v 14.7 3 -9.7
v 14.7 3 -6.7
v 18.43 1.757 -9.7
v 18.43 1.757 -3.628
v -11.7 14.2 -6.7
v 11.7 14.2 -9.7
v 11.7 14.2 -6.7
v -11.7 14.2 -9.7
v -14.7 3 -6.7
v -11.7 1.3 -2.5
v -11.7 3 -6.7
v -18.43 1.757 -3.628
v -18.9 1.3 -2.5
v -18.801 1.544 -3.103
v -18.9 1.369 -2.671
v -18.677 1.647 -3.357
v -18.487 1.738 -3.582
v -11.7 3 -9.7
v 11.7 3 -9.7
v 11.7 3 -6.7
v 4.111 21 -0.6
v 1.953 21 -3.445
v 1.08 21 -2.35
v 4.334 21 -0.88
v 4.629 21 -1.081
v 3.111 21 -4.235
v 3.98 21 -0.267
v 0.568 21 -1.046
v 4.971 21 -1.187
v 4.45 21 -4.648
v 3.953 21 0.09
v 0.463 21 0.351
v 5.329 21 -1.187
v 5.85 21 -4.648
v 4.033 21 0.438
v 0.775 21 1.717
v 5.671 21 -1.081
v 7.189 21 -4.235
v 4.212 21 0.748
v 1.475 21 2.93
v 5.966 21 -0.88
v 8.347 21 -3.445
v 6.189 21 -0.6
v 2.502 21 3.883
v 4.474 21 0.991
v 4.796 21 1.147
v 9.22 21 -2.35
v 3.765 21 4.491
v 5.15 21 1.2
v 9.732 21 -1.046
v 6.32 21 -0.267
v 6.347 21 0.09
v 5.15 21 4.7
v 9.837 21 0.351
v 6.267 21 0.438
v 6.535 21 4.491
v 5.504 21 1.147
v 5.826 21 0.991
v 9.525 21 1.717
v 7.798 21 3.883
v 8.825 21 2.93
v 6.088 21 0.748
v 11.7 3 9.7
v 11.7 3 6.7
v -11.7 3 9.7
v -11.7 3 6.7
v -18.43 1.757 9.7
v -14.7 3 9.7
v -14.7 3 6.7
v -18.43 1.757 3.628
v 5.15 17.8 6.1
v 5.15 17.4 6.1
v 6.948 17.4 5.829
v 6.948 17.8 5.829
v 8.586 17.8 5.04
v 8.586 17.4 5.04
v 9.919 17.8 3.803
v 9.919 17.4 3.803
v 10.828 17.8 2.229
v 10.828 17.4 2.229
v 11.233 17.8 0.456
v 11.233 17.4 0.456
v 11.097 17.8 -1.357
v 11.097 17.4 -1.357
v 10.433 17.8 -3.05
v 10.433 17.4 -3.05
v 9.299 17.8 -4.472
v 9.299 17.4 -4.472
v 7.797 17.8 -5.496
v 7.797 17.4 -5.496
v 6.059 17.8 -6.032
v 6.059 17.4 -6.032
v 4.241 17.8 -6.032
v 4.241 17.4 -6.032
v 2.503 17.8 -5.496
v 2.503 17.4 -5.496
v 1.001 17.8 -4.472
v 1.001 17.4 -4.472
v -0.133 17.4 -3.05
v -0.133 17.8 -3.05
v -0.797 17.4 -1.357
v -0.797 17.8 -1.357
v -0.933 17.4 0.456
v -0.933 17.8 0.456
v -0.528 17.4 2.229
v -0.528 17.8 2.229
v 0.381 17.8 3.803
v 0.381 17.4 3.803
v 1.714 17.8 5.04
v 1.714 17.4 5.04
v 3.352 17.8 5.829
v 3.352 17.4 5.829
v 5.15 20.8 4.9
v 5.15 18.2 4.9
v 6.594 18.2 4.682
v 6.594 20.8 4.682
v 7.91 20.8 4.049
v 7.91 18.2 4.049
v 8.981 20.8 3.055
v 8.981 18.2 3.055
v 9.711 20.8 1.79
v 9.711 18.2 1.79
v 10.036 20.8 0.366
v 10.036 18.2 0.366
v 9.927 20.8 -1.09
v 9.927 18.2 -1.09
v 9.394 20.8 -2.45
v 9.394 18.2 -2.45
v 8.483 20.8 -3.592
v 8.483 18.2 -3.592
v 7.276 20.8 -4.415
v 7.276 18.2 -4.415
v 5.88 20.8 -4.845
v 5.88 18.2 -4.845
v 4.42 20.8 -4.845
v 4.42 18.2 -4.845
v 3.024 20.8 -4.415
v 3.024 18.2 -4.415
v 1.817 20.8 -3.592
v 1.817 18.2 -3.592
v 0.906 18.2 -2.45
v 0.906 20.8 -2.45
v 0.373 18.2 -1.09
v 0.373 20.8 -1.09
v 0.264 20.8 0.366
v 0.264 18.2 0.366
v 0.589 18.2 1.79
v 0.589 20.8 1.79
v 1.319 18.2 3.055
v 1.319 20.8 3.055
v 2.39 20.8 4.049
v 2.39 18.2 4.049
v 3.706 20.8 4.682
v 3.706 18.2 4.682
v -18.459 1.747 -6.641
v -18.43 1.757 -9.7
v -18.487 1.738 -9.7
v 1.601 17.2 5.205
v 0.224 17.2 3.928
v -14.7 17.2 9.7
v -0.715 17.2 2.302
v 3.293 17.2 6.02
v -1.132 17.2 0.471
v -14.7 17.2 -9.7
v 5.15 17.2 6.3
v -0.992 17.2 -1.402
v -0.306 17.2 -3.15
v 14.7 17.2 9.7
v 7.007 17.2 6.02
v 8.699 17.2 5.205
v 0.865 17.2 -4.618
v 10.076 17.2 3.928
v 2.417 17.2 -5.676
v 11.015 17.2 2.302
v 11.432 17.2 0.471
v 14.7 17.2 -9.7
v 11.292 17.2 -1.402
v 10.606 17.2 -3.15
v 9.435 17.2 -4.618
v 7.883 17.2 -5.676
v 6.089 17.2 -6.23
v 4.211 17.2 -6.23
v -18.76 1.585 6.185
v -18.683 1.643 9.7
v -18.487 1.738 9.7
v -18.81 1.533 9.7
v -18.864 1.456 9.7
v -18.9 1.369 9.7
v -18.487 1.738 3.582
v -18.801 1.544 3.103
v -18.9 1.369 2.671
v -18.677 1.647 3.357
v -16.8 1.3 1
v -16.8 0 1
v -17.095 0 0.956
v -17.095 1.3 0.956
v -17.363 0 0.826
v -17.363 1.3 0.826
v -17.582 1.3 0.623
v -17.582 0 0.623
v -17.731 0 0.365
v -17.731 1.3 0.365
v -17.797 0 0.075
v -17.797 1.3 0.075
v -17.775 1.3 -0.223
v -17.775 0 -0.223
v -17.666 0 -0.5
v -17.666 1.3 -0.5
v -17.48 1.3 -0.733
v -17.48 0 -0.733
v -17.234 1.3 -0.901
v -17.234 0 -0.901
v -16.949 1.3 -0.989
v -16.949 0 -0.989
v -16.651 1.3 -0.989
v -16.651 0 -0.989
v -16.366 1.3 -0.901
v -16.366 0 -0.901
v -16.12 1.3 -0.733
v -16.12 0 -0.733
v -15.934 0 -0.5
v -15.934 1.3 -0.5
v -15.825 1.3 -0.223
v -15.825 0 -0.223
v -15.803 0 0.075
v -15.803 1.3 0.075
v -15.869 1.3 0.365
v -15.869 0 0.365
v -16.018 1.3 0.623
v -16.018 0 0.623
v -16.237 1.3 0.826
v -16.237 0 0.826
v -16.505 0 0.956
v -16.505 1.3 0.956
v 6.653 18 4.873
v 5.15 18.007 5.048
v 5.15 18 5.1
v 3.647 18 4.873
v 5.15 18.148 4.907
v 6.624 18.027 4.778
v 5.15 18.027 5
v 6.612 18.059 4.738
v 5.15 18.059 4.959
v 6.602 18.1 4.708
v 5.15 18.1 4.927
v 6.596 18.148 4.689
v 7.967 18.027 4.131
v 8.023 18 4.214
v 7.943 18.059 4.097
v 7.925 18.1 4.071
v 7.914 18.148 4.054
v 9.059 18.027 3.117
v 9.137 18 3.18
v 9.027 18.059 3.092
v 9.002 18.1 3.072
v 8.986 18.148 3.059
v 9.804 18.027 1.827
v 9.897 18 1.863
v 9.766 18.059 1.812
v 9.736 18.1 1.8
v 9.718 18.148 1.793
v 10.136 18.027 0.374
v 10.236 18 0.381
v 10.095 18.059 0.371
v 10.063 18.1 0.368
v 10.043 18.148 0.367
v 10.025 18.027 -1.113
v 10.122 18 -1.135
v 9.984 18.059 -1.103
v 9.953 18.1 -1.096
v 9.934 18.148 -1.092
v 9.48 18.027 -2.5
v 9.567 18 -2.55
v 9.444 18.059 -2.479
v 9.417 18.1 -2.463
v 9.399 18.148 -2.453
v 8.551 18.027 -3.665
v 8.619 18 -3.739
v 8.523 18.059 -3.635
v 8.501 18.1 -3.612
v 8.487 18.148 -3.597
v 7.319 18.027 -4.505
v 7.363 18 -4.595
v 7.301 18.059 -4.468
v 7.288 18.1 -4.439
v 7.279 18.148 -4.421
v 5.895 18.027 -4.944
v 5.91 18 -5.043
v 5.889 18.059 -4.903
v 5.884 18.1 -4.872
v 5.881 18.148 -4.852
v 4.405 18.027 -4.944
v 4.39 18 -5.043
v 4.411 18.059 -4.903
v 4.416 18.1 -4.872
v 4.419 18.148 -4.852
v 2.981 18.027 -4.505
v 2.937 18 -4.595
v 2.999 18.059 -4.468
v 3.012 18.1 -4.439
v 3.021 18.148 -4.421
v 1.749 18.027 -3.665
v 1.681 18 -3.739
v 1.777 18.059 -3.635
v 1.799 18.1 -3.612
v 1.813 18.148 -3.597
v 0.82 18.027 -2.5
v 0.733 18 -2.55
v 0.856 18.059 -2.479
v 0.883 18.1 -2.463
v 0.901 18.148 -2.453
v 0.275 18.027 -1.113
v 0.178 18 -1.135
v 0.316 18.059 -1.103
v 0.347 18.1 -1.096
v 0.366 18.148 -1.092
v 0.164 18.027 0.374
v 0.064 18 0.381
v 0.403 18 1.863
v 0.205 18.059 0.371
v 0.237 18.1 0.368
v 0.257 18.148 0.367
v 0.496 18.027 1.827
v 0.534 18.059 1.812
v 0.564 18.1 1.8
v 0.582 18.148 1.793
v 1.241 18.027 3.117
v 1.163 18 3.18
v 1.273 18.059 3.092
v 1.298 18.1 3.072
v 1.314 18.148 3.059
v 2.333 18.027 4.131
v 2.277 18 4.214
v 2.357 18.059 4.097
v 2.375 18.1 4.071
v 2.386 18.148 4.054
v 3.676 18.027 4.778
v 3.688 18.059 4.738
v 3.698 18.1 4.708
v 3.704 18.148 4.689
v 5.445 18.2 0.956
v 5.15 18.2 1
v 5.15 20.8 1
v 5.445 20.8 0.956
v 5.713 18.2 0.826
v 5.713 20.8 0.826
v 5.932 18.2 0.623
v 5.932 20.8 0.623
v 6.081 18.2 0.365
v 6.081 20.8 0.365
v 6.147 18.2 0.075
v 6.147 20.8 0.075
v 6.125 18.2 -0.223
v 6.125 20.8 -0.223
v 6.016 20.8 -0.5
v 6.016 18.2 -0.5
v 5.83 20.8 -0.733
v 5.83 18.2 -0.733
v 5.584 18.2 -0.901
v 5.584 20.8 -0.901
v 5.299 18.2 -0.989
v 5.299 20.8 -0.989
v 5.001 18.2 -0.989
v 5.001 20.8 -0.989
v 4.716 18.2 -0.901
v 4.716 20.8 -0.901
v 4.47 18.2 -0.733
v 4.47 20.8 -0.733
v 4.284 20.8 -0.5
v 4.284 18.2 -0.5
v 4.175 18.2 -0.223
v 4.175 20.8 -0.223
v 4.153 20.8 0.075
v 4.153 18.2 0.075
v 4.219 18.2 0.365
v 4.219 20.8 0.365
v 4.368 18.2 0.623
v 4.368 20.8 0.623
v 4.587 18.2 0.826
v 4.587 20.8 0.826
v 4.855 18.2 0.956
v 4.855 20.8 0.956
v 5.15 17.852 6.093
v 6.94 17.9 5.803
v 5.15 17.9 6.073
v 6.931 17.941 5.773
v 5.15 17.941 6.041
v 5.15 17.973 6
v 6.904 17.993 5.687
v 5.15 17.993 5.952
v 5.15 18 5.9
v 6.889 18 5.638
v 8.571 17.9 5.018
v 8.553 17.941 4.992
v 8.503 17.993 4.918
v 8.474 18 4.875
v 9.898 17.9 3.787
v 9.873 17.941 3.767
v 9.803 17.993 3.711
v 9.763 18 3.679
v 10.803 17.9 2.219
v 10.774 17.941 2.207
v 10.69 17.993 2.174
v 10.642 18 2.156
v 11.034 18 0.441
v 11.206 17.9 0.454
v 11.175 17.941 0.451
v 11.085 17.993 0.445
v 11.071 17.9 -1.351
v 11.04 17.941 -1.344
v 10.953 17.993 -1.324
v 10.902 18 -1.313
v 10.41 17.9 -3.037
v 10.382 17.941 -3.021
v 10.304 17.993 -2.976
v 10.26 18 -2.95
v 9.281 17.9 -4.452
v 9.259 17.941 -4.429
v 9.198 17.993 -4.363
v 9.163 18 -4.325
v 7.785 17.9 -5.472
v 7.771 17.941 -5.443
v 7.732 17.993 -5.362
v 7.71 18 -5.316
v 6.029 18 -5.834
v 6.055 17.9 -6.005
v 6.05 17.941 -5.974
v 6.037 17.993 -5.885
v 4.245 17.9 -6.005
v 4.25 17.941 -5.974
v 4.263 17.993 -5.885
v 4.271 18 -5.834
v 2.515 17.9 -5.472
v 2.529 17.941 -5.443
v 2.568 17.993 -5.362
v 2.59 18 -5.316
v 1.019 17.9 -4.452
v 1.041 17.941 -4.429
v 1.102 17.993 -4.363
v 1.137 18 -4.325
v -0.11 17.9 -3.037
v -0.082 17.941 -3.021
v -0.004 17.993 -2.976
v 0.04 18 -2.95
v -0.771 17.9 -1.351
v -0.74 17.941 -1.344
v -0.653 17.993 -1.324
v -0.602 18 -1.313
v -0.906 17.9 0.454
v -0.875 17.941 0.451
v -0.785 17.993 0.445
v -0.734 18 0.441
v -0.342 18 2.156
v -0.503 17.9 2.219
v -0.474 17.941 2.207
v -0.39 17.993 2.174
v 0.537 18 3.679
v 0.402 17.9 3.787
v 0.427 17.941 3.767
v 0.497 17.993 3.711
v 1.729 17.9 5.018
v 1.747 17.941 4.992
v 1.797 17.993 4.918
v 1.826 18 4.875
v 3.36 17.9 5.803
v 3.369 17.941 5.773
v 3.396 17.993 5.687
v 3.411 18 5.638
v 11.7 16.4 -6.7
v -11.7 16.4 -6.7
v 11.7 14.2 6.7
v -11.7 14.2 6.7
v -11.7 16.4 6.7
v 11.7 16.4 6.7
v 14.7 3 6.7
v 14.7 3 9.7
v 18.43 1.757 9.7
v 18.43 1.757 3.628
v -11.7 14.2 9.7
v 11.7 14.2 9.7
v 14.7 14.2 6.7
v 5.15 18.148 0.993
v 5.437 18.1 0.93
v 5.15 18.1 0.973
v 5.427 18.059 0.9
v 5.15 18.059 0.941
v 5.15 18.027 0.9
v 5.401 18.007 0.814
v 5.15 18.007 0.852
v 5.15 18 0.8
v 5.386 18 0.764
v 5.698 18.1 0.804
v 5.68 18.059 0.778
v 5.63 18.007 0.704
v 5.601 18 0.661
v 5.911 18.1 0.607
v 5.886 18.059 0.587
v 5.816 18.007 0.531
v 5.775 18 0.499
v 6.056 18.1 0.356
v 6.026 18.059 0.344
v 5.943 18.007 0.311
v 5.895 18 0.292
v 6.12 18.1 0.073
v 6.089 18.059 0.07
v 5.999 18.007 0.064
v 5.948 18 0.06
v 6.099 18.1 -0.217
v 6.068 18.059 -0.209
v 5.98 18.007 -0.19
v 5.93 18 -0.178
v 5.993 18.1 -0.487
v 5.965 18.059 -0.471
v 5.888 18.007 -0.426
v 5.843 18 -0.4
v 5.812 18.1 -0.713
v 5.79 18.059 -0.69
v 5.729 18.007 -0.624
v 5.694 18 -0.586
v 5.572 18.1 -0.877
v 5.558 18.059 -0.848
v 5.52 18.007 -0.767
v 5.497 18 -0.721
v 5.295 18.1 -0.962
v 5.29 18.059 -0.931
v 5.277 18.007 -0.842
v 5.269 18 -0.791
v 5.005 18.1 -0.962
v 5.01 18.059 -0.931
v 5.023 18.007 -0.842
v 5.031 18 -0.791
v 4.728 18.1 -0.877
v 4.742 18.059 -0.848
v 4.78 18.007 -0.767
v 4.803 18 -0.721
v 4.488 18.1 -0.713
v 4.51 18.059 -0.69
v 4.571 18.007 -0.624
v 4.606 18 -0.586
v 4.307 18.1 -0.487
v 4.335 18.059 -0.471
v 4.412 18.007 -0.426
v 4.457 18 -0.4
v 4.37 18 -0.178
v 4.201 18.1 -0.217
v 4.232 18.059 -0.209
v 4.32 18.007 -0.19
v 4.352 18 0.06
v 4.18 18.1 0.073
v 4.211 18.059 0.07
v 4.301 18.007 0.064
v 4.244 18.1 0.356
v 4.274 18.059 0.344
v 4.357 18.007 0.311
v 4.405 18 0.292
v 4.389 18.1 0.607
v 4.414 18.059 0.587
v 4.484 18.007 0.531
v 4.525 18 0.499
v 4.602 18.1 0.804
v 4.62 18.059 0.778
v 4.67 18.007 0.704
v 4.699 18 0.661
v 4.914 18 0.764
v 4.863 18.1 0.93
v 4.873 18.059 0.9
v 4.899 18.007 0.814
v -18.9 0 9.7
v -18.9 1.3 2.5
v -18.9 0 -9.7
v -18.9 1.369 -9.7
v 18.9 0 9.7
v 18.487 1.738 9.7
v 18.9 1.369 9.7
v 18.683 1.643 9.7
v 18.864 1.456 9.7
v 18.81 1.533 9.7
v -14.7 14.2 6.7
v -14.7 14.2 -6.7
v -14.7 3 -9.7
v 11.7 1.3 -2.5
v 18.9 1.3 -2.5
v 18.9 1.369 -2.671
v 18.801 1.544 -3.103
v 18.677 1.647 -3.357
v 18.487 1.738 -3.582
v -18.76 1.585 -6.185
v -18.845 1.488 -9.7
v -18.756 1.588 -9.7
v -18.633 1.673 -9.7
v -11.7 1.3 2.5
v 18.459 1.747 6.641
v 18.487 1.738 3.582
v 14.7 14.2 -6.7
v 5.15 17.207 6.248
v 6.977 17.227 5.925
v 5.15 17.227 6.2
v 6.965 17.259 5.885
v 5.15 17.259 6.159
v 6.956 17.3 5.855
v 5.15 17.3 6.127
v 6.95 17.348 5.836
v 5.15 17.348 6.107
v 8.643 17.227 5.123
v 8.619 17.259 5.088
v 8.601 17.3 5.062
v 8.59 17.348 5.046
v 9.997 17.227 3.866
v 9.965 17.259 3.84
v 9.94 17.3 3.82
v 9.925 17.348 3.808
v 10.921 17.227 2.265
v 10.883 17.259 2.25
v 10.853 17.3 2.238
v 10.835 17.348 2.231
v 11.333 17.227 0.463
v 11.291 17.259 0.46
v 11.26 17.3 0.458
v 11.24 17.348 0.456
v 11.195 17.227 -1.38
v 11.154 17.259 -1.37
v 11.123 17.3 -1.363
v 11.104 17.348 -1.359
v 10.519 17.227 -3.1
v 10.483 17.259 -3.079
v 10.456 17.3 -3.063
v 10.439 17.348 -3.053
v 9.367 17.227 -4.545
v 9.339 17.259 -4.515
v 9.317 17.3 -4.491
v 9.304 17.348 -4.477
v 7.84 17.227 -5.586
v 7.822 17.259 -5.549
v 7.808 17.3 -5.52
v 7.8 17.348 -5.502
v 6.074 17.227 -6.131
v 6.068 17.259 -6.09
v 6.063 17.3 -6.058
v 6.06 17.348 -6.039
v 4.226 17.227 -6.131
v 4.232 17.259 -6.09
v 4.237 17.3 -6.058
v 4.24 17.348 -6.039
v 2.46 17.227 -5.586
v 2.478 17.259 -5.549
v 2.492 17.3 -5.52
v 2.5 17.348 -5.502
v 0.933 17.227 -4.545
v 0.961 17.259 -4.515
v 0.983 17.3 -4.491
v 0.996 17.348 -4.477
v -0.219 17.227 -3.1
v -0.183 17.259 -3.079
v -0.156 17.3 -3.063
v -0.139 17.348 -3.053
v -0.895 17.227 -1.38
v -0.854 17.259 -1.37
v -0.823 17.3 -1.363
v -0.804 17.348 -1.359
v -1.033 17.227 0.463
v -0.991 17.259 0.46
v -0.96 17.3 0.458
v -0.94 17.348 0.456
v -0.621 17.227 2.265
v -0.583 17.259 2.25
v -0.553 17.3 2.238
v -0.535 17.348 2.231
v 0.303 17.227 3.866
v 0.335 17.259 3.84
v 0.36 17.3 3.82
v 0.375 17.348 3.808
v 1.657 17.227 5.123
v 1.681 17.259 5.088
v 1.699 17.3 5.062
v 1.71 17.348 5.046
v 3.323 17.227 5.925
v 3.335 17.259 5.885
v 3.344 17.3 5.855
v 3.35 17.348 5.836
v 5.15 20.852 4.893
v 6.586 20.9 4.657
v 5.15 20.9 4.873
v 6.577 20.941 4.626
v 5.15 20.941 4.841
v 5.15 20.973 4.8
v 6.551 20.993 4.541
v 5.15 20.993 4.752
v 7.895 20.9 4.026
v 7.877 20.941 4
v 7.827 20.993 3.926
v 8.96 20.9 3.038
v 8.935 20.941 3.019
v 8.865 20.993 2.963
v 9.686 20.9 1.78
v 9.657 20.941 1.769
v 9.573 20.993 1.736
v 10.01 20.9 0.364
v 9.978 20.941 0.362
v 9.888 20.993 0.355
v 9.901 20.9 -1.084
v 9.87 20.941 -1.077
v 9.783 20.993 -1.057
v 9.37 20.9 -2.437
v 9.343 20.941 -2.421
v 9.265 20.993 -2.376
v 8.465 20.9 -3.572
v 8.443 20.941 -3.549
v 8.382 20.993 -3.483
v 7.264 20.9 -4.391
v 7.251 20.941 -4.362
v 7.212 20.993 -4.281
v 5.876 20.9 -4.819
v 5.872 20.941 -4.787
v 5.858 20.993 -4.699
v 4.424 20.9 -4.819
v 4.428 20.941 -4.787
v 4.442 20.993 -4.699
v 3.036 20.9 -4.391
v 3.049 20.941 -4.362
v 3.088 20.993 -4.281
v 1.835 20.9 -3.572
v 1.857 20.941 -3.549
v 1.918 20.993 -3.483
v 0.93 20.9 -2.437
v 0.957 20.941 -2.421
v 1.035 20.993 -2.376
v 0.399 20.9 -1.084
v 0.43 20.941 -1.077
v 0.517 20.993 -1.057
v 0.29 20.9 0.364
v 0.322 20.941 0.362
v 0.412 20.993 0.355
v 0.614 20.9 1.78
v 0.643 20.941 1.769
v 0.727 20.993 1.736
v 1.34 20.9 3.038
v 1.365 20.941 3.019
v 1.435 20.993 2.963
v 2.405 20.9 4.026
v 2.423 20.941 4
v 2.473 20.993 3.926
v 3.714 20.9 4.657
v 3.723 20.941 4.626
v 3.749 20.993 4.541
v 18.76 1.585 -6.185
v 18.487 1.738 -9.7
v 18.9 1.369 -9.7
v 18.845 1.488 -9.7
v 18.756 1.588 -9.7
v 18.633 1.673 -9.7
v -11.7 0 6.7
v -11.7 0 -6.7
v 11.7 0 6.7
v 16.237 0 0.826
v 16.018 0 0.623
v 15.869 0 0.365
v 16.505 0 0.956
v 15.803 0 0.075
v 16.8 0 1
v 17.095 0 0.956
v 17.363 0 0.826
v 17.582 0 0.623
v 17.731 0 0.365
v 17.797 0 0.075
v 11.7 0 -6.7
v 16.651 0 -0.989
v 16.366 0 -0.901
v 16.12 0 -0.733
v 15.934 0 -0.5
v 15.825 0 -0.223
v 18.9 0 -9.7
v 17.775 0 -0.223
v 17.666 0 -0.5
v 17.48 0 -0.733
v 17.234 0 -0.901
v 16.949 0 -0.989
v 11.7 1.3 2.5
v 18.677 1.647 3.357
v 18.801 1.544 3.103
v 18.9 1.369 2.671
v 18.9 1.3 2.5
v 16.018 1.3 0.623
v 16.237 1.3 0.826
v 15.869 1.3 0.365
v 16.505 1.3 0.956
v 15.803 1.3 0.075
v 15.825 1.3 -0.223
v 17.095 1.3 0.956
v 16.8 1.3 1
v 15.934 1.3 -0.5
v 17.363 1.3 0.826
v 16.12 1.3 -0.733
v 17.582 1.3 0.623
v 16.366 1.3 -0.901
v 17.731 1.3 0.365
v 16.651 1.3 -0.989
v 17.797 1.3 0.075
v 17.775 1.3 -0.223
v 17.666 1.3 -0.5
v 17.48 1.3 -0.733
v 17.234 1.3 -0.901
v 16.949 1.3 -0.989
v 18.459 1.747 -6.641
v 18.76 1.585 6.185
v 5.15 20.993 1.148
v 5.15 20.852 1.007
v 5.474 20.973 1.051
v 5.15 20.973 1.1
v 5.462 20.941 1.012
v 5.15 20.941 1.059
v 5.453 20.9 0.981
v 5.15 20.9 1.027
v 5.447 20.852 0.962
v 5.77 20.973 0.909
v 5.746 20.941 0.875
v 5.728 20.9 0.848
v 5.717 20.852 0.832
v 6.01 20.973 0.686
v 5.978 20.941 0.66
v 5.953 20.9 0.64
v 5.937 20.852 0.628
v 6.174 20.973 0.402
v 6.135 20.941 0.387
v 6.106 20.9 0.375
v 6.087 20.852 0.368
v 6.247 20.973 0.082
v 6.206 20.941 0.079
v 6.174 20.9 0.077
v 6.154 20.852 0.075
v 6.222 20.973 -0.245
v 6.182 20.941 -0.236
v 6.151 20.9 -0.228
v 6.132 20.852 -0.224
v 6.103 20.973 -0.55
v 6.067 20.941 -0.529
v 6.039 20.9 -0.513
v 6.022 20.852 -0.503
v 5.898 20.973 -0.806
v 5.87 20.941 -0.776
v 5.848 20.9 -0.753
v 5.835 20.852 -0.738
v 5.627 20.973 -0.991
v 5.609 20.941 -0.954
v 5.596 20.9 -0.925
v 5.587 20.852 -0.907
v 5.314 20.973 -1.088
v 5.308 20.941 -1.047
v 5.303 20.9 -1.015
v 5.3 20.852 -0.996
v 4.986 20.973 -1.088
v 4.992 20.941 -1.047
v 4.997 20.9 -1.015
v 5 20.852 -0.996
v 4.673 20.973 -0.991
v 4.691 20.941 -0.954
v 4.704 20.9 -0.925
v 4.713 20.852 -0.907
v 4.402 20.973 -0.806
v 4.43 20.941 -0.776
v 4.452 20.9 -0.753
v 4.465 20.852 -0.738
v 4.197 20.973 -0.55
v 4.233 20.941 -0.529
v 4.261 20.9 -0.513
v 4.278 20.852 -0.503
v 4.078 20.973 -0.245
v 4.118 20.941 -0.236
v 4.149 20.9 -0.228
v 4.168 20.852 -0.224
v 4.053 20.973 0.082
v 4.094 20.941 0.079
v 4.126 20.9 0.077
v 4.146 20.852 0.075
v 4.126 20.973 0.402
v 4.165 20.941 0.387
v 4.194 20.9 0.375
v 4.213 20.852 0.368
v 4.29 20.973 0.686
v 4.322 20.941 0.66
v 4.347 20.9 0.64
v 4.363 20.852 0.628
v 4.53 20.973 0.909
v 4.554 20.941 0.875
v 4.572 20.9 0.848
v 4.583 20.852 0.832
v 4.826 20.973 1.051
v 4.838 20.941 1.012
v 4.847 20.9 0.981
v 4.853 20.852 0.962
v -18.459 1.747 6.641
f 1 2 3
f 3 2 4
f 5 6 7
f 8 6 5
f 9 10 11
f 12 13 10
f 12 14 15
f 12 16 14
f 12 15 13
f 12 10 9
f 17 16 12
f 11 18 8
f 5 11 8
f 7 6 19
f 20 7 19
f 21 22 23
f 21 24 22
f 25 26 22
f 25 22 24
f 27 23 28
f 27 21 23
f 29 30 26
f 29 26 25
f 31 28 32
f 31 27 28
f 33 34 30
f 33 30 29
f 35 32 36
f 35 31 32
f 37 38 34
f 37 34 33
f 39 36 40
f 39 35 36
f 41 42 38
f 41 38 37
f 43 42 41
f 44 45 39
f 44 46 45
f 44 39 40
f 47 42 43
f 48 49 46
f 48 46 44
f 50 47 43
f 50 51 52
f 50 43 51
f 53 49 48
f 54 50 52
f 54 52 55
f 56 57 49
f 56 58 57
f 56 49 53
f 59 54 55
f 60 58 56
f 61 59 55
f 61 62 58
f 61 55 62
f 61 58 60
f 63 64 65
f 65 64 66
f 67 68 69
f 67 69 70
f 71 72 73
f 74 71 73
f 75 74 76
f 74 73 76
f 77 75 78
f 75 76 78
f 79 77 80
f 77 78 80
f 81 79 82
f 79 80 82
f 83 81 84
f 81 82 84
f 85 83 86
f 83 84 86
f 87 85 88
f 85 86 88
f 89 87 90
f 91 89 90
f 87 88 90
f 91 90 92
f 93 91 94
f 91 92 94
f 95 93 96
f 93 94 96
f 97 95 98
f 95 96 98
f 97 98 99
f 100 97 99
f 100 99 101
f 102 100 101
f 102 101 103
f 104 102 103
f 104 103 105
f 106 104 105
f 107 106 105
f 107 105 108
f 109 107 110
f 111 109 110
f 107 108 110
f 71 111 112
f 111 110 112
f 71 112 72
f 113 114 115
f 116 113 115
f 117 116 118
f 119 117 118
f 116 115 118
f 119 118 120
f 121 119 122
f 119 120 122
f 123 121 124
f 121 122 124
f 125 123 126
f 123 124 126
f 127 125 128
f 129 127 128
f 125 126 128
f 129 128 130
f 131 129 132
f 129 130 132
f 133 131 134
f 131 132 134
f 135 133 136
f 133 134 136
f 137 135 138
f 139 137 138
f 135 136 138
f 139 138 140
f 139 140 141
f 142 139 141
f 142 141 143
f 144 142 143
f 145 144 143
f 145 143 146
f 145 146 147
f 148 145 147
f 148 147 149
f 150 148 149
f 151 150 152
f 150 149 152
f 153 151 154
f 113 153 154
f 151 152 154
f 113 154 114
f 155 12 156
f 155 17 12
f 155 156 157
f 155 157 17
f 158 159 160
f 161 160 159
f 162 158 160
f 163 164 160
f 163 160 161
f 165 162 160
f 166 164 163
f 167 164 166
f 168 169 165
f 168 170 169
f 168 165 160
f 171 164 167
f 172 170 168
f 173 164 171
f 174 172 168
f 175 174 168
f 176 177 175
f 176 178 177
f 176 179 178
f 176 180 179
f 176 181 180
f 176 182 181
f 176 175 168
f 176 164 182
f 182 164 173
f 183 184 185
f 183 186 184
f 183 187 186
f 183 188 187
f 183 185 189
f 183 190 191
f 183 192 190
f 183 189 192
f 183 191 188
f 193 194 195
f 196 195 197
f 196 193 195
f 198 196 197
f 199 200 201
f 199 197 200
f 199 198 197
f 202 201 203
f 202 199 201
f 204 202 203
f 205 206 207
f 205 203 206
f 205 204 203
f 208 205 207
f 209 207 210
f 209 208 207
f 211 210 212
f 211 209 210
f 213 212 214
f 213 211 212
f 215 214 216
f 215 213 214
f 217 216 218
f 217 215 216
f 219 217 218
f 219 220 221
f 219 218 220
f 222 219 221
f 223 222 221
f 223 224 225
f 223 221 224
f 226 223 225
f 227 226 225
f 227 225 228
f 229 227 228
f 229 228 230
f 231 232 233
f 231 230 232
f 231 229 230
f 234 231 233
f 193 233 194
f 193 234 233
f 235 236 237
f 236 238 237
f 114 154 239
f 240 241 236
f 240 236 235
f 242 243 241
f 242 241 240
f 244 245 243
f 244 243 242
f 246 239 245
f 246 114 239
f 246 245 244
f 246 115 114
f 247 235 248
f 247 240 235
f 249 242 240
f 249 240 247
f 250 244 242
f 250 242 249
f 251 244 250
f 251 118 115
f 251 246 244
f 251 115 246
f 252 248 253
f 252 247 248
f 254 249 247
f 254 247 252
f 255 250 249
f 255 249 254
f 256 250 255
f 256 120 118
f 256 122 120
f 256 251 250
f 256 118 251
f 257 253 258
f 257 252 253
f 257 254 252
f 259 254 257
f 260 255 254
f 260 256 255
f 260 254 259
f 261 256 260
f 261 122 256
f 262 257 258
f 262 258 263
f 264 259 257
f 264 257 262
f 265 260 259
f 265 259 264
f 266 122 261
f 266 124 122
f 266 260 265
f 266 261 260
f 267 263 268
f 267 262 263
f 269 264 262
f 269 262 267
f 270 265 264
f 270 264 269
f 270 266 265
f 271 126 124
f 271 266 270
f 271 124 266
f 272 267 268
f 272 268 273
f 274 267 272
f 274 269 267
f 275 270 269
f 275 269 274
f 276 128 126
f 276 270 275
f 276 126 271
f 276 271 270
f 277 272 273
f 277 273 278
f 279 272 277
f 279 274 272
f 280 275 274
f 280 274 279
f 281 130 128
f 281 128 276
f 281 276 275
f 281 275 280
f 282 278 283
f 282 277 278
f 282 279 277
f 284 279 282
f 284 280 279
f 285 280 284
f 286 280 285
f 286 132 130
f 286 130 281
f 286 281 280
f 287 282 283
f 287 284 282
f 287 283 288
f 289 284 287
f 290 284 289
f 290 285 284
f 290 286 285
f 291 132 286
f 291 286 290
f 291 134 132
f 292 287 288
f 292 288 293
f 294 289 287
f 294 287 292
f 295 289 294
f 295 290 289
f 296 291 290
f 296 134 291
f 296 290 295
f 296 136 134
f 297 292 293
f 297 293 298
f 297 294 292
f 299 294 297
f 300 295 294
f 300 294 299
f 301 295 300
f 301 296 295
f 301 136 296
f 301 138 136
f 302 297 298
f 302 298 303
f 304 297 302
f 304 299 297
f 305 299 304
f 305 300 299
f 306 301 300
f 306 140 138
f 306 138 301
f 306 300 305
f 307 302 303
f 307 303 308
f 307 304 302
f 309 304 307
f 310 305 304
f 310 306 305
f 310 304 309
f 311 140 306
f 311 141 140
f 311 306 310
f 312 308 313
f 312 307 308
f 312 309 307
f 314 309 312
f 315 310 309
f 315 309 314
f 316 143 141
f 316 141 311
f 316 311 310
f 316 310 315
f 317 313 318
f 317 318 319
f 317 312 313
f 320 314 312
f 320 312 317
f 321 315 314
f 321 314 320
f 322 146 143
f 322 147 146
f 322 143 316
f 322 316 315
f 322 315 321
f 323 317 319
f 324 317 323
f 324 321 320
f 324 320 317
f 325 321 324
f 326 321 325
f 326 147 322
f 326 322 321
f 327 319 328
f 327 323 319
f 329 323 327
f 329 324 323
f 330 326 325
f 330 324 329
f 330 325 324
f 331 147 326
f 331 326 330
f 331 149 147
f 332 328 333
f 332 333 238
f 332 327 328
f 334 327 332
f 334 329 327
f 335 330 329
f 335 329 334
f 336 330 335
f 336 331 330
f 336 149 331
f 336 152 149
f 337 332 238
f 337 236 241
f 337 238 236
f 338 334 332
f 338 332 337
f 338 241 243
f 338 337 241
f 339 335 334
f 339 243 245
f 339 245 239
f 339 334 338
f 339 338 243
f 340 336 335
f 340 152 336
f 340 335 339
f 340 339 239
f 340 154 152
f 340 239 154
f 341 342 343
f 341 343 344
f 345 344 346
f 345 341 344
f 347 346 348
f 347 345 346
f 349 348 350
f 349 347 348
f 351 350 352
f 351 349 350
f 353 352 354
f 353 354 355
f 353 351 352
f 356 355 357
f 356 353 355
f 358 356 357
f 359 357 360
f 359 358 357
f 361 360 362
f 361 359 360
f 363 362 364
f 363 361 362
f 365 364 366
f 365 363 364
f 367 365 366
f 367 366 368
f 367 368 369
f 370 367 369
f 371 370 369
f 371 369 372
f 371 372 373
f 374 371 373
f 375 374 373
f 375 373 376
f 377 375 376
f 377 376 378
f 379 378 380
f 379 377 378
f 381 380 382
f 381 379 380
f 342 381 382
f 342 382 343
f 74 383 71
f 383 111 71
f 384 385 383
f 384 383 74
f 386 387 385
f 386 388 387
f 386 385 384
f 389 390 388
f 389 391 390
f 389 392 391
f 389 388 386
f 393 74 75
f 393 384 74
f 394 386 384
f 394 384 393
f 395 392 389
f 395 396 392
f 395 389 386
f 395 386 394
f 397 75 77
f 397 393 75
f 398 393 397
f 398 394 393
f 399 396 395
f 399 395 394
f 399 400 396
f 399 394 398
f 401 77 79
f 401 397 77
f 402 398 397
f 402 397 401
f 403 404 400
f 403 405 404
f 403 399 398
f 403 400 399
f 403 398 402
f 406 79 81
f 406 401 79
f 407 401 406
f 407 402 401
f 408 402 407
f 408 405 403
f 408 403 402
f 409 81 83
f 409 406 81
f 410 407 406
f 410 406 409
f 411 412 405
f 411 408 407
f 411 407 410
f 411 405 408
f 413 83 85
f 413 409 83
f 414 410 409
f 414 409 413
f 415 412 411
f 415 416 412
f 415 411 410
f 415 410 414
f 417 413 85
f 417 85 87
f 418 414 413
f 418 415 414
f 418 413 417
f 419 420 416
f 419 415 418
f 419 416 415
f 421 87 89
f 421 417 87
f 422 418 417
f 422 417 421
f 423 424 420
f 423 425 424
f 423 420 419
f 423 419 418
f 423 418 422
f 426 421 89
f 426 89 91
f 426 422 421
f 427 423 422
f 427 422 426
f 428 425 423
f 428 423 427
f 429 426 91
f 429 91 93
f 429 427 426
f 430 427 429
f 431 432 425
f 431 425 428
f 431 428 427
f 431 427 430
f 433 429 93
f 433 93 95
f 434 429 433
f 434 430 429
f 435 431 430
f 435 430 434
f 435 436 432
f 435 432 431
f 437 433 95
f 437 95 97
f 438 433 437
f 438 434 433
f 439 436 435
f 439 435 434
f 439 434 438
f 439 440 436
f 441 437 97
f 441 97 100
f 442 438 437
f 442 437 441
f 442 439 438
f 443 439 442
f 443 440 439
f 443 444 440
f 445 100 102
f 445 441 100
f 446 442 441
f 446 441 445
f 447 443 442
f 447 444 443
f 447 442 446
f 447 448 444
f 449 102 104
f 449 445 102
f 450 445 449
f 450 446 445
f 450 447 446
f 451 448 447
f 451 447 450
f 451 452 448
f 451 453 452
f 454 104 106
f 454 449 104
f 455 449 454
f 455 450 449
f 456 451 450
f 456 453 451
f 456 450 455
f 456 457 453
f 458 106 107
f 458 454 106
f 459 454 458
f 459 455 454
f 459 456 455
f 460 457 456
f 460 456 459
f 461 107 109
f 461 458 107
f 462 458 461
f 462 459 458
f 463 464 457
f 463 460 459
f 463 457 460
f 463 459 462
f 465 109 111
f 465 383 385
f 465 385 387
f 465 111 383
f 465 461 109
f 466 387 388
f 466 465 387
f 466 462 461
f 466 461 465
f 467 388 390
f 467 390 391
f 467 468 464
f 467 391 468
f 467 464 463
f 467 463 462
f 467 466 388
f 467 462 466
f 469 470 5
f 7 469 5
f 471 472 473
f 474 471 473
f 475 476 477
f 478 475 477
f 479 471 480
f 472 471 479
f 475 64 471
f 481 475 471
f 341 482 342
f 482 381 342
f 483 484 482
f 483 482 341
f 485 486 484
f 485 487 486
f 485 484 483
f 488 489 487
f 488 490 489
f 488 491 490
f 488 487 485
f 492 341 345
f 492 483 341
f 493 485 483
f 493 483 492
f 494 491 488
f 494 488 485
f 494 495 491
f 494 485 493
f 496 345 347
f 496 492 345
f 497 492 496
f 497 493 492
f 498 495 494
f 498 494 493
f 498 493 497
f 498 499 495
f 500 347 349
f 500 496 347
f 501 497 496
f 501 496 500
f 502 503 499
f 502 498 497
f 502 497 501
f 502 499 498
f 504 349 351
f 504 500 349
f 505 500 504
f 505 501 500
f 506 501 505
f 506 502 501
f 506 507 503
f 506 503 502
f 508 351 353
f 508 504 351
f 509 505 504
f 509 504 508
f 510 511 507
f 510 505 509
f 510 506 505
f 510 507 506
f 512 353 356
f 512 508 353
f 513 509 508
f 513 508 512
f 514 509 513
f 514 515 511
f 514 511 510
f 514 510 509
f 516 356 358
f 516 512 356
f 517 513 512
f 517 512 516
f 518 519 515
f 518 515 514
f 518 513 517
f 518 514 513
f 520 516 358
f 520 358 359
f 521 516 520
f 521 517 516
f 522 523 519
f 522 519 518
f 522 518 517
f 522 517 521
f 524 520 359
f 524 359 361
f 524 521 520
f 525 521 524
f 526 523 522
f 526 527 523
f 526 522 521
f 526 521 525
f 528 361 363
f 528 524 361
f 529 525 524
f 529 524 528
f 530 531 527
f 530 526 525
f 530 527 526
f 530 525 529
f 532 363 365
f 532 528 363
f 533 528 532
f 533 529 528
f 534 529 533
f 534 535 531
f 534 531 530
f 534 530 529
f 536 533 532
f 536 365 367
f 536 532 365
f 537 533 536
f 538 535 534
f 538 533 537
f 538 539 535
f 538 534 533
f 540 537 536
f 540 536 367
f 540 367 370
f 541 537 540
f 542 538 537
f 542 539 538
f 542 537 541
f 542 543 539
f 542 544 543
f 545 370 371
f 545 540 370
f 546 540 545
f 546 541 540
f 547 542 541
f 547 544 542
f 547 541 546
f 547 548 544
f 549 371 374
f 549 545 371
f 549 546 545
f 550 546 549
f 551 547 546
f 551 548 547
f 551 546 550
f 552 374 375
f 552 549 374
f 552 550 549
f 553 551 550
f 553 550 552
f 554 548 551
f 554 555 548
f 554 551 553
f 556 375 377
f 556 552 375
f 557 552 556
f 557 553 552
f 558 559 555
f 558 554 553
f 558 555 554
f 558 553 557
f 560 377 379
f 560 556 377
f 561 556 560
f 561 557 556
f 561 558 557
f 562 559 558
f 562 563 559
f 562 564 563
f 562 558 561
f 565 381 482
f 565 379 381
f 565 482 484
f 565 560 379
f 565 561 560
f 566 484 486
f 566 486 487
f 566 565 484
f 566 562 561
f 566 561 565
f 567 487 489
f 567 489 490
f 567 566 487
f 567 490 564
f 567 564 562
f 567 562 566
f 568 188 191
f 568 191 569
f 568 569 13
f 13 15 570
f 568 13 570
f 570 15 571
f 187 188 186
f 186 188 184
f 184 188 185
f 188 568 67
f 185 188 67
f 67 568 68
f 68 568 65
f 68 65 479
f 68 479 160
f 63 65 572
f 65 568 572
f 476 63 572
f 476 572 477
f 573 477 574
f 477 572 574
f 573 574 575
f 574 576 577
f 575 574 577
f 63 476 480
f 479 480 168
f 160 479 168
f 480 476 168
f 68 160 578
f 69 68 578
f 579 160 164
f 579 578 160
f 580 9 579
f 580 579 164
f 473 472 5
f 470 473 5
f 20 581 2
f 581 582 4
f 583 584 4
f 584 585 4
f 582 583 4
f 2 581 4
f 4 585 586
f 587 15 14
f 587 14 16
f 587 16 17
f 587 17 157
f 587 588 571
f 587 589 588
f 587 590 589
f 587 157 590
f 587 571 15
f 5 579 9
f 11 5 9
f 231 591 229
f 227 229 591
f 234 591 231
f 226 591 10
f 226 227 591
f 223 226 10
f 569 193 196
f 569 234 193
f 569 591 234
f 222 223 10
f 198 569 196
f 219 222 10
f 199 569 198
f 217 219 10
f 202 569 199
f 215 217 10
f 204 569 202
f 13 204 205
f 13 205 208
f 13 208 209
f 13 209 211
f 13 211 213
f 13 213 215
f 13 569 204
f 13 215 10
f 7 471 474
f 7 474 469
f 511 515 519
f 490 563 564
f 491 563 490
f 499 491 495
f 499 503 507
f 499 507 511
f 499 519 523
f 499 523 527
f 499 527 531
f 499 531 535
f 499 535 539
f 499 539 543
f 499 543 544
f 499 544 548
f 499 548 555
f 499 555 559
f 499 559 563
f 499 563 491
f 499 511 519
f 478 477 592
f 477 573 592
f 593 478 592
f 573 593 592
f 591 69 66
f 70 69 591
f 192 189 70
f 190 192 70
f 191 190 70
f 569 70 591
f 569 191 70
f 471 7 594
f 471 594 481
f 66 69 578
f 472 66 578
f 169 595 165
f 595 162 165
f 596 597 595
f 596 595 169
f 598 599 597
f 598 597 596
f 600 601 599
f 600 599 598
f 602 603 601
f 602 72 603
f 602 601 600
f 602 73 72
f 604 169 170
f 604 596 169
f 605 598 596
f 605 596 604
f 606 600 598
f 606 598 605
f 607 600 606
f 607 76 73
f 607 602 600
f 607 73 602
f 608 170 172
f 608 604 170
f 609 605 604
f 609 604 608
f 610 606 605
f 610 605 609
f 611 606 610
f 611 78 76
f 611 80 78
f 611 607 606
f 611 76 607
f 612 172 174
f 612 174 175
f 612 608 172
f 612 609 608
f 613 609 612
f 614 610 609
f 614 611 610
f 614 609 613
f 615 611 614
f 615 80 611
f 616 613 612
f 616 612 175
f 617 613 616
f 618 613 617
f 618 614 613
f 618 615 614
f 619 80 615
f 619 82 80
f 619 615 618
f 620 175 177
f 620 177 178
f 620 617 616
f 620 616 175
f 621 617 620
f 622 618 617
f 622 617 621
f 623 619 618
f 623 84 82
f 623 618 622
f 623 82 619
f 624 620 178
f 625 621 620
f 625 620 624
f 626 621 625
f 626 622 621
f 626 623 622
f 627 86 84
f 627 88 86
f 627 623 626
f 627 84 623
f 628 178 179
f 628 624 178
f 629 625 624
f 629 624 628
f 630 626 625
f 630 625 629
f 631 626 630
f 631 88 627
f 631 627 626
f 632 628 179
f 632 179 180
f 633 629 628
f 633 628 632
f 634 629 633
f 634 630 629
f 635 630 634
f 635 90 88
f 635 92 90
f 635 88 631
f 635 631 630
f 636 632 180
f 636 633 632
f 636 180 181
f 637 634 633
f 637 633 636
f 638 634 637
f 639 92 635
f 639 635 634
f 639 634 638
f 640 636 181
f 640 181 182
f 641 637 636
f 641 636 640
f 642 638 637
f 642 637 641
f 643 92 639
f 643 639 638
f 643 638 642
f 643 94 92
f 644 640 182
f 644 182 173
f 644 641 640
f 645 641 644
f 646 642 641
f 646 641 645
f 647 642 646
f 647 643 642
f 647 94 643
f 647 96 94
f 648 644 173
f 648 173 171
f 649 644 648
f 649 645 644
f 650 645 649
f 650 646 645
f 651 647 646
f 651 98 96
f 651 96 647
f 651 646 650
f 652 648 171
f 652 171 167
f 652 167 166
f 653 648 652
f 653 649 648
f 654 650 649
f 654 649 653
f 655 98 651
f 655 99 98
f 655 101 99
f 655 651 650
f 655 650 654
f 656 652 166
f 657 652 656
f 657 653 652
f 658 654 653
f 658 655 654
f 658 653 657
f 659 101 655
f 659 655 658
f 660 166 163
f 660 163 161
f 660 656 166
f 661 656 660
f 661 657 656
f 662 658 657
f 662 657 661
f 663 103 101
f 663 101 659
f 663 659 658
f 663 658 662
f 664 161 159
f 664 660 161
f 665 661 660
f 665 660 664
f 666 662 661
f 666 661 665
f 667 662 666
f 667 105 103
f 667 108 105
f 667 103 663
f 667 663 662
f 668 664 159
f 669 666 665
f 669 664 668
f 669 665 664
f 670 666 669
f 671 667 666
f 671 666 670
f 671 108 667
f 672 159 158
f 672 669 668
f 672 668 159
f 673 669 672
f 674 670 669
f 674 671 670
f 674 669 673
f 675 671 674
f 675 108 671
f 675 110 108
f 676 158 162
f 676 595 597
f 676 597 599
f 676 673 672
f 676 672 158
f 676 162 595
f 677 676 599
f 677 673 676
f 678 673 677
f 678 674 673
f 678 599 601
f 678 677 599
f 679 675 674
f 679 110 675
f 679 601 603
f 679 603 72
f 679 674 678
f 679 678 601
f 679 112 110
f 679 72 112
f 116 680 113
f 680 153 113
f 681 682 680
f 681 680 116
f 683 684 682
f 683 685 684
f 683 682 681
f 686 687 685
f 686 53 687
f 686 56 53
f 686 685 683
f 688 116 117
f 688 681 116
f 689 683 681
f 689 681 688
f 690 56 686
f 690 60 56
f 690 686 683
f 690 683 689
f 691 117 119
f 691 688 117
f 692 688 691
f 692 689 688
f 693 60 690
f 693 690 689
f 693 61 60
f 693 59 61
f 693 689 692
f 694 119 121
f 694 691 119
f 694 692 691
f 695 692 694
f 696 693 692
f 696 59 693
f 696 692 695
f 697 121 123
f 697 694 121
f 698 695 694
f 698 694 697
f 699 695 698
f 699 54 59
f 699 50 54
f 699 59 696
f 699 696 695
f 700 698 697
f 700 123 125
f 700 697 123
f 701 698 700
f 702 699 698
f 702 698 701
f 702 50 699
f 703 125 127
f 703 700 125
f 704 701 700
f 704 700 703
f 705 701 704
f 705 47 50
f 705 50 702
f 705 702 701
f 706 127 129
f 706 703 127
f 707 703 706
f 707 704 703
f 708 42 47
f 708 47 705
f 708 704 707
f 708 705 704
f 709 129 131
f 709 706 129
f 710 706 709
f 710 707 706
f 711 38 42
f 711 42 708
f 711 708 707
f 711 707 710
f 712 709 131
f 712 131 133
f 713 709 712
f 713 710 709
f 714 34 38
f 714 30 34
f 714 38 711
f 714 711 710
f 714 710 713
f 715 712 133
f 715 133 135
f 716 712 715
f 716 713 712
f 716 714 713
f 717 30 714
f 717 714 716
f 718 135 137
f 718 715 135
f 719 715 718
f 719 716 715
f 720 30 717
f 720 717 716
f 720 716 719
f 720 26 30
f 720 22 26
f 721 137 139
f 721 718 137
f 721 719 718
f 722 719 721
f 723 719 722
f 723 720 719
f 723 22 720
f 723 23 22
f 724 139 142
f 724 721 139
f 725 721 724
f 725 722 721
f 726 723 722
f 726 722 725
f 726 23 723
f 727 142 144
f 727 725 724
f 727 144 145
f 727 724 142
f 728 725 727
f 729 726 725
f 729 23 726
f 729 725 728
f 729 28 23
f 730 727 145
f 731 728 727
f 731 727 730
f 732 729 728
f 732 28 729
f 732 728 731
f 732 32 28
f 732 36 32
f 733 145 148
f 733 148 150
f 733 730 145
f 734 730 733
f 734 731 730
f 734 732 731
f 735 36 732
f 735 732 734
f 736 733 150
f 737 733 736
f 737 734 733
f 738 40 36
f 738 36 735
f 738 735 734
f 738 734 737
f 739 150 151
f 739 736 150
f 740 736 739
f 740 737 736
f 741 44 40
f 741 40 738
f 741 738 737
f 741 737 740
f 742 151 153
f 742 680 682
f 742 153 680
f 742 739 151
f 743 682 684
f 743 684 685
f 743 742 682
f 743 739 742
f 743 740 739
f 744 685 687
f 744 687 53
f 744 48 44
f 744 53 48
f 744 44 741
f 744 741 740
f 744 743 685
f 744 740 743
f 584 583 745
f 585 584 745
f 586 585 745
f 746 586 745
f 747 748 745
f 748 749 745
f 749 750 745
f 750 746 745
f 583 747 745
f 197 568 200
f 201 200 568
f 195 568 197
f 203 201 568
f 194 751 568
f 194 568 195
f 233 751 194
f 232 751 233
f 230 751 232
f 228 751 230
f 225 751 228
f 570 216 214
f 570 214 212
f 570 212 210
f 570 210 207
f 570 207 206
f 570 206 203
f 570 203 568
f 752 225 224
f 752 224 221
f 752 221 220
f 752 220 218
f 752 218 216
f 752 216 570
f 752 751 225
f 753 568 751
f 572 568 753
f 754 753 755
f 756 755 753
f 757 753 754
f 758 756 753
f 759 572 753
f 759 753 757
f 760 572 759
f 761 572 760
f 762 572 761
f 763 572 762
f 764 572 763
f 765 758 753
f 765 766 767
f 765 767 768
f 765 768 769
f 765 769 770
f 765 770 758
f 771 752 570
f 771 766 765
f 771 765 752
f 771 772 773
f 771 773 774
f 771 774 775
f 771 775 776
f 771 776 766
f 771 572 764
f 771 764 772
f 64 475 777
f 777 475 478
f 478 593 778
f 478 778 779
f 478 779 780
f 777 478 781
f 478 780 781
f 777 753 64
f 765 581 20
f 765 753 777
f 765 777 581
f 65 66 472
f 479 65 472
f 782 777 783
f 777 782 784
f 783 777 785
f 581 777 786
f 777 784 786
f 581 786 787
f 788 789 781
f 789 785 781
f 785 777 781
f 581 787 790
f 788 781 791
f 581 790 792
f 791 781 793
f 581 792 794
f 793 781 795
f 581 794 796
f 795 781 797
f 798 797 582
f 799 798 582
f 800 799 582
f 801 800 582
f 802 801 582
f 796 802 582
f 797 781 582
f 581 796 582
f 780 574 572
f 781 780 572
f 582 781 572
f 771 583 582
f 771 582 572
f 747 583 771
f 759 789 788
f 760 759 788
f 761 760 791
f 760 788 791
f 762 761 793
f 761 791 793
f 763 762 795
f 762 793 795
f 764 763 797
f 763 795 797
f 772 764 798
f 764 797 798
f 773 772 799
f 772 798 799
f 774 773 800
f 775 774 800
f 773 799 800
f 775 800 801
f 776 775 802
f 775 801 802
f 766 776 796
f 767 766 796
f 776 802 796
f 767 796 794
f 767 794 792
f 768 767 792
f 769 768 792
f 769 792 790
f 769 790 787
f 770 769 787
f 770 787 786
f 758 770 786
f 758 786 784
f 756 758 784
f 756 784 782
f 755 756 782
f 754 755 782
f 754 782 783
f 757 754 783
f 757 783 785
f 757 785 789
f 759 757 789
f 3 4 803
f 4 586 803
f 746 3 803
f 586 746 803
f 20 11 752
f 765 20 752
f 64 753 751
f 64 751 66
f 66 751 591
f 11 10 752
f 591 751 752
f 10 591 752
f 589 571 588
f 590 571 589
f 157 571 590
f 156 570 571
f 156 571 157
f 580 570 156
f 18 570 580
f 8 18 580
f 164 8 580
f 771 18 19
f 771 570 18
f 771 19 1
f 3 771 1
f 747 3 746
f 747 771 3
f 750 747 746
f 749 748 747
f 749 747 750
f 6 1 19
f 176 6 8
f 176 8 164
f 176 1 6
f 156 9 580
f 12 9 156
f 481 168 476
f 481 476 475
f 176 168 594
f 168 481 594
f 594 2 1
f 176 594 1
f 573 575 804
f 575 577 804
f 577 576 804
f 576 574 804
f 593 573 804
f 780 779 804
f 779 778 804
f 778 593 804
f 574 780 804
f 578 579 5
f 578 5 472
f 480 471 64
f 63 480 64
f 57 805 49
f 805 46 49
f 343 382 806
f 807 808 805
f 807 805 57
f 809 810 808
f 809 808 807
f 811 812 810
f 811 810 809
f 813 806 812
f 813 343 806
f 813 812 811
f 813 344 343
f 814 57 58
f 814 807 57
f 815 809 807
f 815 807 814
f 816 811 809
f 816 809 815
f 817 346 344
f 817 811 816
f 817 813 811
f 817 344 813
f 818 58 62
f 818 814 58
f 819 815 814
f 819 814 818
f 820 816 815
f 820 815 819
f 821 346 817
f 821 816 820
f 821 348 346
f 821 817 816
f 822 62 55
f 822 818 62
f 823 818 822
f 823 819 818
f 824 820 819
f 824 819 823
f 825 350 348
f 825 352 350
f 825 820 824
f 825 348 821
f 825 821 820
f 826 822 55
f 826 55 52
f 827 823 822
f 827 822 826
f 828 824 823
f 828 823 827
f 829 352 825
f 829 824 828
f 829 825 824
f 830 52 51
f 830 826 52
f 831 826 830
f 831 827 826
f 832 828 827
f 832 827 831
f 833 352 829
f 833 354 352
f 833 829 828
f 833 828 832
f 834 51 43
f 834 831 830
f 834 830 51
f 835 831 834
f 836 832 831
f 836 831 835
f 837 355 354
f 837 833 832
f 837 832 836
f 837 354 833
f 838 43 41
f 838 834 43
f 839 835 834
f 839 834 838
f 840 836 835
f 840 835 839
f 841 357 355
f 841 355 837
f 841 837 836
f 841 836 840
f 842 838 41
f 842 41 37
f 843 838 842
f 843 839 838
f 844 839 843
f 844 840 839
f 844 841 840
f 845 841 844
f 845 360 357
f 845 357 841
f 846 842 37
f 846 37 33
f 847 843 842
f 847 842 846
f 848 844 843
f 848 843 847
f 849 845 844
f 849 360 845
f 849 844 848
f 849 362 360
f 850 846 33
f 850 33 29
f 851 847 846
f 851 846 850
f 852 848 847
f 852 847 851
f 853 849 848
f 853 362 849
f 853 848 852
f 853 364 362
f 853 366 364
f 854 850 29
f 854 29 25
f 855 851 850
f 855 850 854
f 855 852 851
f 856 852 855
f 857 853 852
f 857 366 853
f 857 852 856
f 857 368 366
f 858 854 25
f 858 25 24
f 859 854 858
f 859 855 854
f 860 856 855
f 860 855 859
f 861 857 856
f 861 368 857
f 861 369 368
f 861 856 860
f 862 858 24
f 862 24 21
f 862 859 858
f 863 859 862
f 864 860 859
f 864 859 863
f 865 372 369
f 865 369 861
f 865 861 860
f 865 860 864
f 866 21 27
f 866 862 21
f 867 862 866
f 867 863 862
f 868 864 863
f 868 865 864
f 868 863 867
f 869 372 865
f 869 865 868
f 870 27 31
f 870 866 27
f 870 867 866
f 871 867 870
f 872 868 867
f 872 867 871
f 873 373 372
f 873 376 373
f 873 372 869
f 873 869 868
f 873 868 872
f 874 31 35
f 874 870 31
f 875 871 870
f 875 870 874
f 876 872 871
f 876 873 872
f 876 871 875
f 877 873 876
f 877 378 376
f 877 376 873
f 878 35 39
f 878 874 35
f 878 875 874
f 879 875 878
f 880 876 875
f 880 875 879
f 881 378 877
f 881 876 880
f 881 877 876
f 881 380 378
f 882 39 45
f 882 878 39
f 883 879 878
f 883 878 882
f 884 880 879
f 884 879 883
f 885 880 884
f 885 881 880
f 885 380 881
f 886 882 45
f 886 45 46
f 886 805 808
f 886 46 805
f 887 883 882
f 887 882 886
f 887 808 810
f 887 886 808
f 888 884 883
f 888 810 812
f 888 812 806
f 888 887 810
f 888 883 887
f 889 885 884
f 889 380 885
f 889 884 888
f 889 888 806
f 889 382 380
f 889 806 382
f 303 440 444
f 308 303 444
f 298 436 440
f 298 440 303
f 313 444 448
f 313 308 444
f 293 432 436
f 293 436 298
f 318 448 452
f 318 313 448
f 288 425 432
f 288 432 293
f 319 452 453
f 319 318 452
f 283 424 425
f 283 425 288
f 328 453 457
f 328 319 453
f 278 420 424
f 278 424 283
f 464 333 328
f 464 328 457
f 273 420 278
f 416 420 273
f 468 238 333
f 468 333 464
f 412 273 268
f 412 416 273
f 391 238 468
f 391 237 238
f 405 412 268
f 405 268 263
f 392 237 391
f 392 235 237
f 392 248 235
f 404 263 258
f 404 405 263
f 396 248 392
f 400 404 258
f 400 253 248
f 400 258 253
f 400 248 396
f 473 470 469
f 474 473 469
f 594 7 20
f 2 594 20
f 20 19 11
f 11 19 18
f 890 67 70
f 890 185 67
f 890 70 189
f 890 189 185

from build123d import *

# Parameters (mm, degrees)
SKETCH_1_W          = 29.4
SKETCH_1_H          = 19.4
SKETCH_1_W_2        = 23.4
SKETCH_1_H_2        = 13.4
EXTRUDE_1_DEPTH     = 16.4
SKETCH_2_W          = 29.4
SKETCH_2_H          = 19.4
EXTRUDE_2_DEPTH     = 0.8
SKETCH_3_R          = 6.1
EXTRUDE_3_DEPTH     = 0.8
SKETCH_5_R          = 4.9
SKETCH_5_R_2        = 1
EXTRUDE_4_DEPTH     = 3
FILLET_1_R          = 0.2
SKETCH_7_W          = 13.4
SKETCH_7_H          = 5.6
CUT_EXTRUDE_2_DEPTH = 30
SKETCH_8_W          = 23.4
SKETCH_8_H          = 5.6
CUT_EXTRUDE_3_DEPTH = 30
SKETCH_9_W          = 19.4
SKETCH_9_H          = 3
EXTRUDE_5_DEPTH     = 4.2
CUT_EXTRUDE_4_DEPTH = 20.2
CUT_EXTRUDE_5_DEPTH = 5.1
SKETCH_12_R         = 1
CUT_EXTRUDE_6_DEPTH = 2.2


with BuildPart() as part:
    # 草图1 → 凸台-拉伸1 (new body)
    with BuildSketch(Plane(origin=(0, 0, 0), x_dir=(1, 0, 0), z_dir=(0, 1, 0))):
        Rectangle(SKETCH_1_W, SKETCH_1_H)
        Rectangle(SKETCH_1_W_2, SKETCH_1_H_2, mode=Mode.SUBTRACT)
    extrude(amount=EXTRUDE_1_DEPTH)

    # 草图2 → 凸台-拉伸2 (add)
    with BuildSketch(Plane(origin=(0, 16.4, 0), x_dir=(1, 0, 0), z_dir=(0, 1, 0))):
        Rectangle(SKETCH_2_W, SKETCH_2_H)
    extrude(amount=EXTRUDE_2_DEPTH)

    # 草图3 → 凸台-拉伸3 (add)
    with BuildSketch(Plane(origin=(0, 17.2, 0), x_dir=(1, 0, 0), z_dir=(0, 1, 0))):
        with Locations(Location((5.15, 0, 0), (0, 0, 270))):
            Circle(SKETCH_3_R)
    extrude(amount=EXTRUDE_3_DEPTH)

    # 草图5 → 凸台-拉伸4 (add)
    with BuildSketch(Plane(origin=(0, 18, 0), x_dir=(1, 0, 0), z_dir=(0, 1, 0))):
        with Locations(Location((5.15, 0, 0), (0, 0, 270))):
            Circle(SKETCH_5_R)
        with Locations(Location((5.15, 0, 0), (0, 0, 270))):
            Circle(SKETCH_5_R_2, mode=Mode.SUBTRACT)
    extrude(amount=EXTRUDE_4_DEPTH)

    # 圆角1
    fillet_1_edges = [part.edges().sort_by_distance(p)[0] for p in [
        (5.15, 17.2, -6.1),
        (5.15, 18, -6.1),
        (5.15, 18, -1),
        (5.15, 21, -4.9),
        (5.15, 18, -4.9),
        (5.15, 21, -1),
    ]]
    fillet(fillet_1_edges, radius=FILLET_1_R)

    # 草图7 → 切除-拉伸2 (cut)
    with BuildSketch(Plane.ZY.offset(14.7)):
        with Locations((0, 11.4)):
            Rectangle(SKETCH_7_W, SKETCH_7_H)
        with Locations((0, 5.8)):
            Rectangle(SKETCH_7_W, SKETCH_7_H)
    extrude(amount=-CUT_EXTRUDE_2_DEPTH, mode=Mode.SUBTRACT)

    # 草图8 → 切除-拉伸3 (cut)
    with BuildSketch(Plane(origin=(0, 0, -9.7), x_dir=(-1, 0, 0), z_dir=(0, 0, -1))):
        with Locations((0, 11.4)):
            Rectangle(SKETCH_8_W, SKETCH_8_H)
        with Locations((0, 5.8)):
            Rectangle(SKETCH_8_W, SKETCH_8_H)
    extrude(amount=-CUT_EXTRUDE_3_DEPTH, mode=Mode.SUBTRACT)

    # 草图9 → 凸台-拉伸5 (add)
    with BuildSketch(Plane(origin=(14.7, 0, 0), x_dir=(0, 0, -1), z_dir=(1, 0, 0))):
        with Locations((0, 1.5)):
            Rectangle(SKETCH_9_W, SKETCH_9_H)
    extrude_5 = extrude(amount=EXTRUDE_5_DEPTH)

    # 草图10 → 切除-拉伸4 (cut)
    with BuildSketch(Plane.XY.offset(9.7)):
        with BuildLine():
            add(Edge.make_bspline(
                [(18.486644801, 1.737785066), (18.825886074, 1.616028978), (18.9, 1.36920832)],
                knots=[0.049557912, 0.049557912, 0.049557912, 0.659174515, 0.659174515, 0.659174515], degree=2))
            Line((18.9, 1.36920832), (18.9, 1.6))
            Line((18.9, 1.6), (18.9, 3))
            Line((18.9, 3), (14.7, 3))
            Line((14.7, 3), (18.429736397, 1.756754534))
            add(Edge.make_bspline(
                [(18.429736397, 1.756754534), (18.459066665, 1.747683054), (18.486644801, 1.737785066)],
                knots=[0, 0, 0, 0.049557912, 0.049557912, 0.049557912], degree=2))
        make_face()
    cut_extrude_4 = extrude(amount=-CUT_EXTRUDE_4_DEPTH, mode=Mode.SUBTRACT)

    # 草图11 → 切除-拉伸5 (cut, symmetric)
    with BuildSketch(Plane(origin=(14.7, 0, 0), x_dir=(0, 0, -1), z_dir=(1, 0, 0))):
        Polygon((2.5, 1.3), (6.7, 3), (-6.7, 3), (-2.5, 1.3), align=None)
    cut_extrude_5 = extrude(amount=CUT_EXTRUDE_5_DEPTH, both=True, mode=Mode.SUBTRACT)

    # 草图12 → 切除-拉伸6 (cut)
    with BuildSketch(Plane(origin=(0, 1.3, 0), x_dir=(1, 0, 0), z_dir=(0, 1, 0))):
        with Locations(Location((16.8, 0, 0), (0, 0, 270))):
            Circle(SKETCH_12_R)
    cut_extrude_6 = extrude(amount=-CUT_EXTRUDE_6_DEPTH, mode=Mode.SUBTRACT)

    # 镜向1: 凸台-拉伸5, 切除-拉伸4, 切除-拉伸5, 切除-拉伸6 across plane
    add(extrude_5.mirror(Plane(origin=(0, 0, 0), x_dir=(0, 0, 1), z_dir=(1, 0, 0))))
    add(cut_extrude_4.mirror(Plane(origin=(0, 0, 0), x_dir=(0, 0, 1), z_dir=(1, 0, 0))), mode=Mode.SUBTRACT)
    add(cut_extrude_5.mirror(Plane(origin=(0, 0, 0), x_dir=(0, 0, 1), z_dir=(1, 0, 0))), mode=Mode.SUBTRACT)
    add(cut_extrude_6.mirror(Plane(origin=(0, 0, 0), x_dir=(0, 0, 1), z_dir=(1, 0, 0))), mode=Mode.SUBTRACT)


solid = part.part
